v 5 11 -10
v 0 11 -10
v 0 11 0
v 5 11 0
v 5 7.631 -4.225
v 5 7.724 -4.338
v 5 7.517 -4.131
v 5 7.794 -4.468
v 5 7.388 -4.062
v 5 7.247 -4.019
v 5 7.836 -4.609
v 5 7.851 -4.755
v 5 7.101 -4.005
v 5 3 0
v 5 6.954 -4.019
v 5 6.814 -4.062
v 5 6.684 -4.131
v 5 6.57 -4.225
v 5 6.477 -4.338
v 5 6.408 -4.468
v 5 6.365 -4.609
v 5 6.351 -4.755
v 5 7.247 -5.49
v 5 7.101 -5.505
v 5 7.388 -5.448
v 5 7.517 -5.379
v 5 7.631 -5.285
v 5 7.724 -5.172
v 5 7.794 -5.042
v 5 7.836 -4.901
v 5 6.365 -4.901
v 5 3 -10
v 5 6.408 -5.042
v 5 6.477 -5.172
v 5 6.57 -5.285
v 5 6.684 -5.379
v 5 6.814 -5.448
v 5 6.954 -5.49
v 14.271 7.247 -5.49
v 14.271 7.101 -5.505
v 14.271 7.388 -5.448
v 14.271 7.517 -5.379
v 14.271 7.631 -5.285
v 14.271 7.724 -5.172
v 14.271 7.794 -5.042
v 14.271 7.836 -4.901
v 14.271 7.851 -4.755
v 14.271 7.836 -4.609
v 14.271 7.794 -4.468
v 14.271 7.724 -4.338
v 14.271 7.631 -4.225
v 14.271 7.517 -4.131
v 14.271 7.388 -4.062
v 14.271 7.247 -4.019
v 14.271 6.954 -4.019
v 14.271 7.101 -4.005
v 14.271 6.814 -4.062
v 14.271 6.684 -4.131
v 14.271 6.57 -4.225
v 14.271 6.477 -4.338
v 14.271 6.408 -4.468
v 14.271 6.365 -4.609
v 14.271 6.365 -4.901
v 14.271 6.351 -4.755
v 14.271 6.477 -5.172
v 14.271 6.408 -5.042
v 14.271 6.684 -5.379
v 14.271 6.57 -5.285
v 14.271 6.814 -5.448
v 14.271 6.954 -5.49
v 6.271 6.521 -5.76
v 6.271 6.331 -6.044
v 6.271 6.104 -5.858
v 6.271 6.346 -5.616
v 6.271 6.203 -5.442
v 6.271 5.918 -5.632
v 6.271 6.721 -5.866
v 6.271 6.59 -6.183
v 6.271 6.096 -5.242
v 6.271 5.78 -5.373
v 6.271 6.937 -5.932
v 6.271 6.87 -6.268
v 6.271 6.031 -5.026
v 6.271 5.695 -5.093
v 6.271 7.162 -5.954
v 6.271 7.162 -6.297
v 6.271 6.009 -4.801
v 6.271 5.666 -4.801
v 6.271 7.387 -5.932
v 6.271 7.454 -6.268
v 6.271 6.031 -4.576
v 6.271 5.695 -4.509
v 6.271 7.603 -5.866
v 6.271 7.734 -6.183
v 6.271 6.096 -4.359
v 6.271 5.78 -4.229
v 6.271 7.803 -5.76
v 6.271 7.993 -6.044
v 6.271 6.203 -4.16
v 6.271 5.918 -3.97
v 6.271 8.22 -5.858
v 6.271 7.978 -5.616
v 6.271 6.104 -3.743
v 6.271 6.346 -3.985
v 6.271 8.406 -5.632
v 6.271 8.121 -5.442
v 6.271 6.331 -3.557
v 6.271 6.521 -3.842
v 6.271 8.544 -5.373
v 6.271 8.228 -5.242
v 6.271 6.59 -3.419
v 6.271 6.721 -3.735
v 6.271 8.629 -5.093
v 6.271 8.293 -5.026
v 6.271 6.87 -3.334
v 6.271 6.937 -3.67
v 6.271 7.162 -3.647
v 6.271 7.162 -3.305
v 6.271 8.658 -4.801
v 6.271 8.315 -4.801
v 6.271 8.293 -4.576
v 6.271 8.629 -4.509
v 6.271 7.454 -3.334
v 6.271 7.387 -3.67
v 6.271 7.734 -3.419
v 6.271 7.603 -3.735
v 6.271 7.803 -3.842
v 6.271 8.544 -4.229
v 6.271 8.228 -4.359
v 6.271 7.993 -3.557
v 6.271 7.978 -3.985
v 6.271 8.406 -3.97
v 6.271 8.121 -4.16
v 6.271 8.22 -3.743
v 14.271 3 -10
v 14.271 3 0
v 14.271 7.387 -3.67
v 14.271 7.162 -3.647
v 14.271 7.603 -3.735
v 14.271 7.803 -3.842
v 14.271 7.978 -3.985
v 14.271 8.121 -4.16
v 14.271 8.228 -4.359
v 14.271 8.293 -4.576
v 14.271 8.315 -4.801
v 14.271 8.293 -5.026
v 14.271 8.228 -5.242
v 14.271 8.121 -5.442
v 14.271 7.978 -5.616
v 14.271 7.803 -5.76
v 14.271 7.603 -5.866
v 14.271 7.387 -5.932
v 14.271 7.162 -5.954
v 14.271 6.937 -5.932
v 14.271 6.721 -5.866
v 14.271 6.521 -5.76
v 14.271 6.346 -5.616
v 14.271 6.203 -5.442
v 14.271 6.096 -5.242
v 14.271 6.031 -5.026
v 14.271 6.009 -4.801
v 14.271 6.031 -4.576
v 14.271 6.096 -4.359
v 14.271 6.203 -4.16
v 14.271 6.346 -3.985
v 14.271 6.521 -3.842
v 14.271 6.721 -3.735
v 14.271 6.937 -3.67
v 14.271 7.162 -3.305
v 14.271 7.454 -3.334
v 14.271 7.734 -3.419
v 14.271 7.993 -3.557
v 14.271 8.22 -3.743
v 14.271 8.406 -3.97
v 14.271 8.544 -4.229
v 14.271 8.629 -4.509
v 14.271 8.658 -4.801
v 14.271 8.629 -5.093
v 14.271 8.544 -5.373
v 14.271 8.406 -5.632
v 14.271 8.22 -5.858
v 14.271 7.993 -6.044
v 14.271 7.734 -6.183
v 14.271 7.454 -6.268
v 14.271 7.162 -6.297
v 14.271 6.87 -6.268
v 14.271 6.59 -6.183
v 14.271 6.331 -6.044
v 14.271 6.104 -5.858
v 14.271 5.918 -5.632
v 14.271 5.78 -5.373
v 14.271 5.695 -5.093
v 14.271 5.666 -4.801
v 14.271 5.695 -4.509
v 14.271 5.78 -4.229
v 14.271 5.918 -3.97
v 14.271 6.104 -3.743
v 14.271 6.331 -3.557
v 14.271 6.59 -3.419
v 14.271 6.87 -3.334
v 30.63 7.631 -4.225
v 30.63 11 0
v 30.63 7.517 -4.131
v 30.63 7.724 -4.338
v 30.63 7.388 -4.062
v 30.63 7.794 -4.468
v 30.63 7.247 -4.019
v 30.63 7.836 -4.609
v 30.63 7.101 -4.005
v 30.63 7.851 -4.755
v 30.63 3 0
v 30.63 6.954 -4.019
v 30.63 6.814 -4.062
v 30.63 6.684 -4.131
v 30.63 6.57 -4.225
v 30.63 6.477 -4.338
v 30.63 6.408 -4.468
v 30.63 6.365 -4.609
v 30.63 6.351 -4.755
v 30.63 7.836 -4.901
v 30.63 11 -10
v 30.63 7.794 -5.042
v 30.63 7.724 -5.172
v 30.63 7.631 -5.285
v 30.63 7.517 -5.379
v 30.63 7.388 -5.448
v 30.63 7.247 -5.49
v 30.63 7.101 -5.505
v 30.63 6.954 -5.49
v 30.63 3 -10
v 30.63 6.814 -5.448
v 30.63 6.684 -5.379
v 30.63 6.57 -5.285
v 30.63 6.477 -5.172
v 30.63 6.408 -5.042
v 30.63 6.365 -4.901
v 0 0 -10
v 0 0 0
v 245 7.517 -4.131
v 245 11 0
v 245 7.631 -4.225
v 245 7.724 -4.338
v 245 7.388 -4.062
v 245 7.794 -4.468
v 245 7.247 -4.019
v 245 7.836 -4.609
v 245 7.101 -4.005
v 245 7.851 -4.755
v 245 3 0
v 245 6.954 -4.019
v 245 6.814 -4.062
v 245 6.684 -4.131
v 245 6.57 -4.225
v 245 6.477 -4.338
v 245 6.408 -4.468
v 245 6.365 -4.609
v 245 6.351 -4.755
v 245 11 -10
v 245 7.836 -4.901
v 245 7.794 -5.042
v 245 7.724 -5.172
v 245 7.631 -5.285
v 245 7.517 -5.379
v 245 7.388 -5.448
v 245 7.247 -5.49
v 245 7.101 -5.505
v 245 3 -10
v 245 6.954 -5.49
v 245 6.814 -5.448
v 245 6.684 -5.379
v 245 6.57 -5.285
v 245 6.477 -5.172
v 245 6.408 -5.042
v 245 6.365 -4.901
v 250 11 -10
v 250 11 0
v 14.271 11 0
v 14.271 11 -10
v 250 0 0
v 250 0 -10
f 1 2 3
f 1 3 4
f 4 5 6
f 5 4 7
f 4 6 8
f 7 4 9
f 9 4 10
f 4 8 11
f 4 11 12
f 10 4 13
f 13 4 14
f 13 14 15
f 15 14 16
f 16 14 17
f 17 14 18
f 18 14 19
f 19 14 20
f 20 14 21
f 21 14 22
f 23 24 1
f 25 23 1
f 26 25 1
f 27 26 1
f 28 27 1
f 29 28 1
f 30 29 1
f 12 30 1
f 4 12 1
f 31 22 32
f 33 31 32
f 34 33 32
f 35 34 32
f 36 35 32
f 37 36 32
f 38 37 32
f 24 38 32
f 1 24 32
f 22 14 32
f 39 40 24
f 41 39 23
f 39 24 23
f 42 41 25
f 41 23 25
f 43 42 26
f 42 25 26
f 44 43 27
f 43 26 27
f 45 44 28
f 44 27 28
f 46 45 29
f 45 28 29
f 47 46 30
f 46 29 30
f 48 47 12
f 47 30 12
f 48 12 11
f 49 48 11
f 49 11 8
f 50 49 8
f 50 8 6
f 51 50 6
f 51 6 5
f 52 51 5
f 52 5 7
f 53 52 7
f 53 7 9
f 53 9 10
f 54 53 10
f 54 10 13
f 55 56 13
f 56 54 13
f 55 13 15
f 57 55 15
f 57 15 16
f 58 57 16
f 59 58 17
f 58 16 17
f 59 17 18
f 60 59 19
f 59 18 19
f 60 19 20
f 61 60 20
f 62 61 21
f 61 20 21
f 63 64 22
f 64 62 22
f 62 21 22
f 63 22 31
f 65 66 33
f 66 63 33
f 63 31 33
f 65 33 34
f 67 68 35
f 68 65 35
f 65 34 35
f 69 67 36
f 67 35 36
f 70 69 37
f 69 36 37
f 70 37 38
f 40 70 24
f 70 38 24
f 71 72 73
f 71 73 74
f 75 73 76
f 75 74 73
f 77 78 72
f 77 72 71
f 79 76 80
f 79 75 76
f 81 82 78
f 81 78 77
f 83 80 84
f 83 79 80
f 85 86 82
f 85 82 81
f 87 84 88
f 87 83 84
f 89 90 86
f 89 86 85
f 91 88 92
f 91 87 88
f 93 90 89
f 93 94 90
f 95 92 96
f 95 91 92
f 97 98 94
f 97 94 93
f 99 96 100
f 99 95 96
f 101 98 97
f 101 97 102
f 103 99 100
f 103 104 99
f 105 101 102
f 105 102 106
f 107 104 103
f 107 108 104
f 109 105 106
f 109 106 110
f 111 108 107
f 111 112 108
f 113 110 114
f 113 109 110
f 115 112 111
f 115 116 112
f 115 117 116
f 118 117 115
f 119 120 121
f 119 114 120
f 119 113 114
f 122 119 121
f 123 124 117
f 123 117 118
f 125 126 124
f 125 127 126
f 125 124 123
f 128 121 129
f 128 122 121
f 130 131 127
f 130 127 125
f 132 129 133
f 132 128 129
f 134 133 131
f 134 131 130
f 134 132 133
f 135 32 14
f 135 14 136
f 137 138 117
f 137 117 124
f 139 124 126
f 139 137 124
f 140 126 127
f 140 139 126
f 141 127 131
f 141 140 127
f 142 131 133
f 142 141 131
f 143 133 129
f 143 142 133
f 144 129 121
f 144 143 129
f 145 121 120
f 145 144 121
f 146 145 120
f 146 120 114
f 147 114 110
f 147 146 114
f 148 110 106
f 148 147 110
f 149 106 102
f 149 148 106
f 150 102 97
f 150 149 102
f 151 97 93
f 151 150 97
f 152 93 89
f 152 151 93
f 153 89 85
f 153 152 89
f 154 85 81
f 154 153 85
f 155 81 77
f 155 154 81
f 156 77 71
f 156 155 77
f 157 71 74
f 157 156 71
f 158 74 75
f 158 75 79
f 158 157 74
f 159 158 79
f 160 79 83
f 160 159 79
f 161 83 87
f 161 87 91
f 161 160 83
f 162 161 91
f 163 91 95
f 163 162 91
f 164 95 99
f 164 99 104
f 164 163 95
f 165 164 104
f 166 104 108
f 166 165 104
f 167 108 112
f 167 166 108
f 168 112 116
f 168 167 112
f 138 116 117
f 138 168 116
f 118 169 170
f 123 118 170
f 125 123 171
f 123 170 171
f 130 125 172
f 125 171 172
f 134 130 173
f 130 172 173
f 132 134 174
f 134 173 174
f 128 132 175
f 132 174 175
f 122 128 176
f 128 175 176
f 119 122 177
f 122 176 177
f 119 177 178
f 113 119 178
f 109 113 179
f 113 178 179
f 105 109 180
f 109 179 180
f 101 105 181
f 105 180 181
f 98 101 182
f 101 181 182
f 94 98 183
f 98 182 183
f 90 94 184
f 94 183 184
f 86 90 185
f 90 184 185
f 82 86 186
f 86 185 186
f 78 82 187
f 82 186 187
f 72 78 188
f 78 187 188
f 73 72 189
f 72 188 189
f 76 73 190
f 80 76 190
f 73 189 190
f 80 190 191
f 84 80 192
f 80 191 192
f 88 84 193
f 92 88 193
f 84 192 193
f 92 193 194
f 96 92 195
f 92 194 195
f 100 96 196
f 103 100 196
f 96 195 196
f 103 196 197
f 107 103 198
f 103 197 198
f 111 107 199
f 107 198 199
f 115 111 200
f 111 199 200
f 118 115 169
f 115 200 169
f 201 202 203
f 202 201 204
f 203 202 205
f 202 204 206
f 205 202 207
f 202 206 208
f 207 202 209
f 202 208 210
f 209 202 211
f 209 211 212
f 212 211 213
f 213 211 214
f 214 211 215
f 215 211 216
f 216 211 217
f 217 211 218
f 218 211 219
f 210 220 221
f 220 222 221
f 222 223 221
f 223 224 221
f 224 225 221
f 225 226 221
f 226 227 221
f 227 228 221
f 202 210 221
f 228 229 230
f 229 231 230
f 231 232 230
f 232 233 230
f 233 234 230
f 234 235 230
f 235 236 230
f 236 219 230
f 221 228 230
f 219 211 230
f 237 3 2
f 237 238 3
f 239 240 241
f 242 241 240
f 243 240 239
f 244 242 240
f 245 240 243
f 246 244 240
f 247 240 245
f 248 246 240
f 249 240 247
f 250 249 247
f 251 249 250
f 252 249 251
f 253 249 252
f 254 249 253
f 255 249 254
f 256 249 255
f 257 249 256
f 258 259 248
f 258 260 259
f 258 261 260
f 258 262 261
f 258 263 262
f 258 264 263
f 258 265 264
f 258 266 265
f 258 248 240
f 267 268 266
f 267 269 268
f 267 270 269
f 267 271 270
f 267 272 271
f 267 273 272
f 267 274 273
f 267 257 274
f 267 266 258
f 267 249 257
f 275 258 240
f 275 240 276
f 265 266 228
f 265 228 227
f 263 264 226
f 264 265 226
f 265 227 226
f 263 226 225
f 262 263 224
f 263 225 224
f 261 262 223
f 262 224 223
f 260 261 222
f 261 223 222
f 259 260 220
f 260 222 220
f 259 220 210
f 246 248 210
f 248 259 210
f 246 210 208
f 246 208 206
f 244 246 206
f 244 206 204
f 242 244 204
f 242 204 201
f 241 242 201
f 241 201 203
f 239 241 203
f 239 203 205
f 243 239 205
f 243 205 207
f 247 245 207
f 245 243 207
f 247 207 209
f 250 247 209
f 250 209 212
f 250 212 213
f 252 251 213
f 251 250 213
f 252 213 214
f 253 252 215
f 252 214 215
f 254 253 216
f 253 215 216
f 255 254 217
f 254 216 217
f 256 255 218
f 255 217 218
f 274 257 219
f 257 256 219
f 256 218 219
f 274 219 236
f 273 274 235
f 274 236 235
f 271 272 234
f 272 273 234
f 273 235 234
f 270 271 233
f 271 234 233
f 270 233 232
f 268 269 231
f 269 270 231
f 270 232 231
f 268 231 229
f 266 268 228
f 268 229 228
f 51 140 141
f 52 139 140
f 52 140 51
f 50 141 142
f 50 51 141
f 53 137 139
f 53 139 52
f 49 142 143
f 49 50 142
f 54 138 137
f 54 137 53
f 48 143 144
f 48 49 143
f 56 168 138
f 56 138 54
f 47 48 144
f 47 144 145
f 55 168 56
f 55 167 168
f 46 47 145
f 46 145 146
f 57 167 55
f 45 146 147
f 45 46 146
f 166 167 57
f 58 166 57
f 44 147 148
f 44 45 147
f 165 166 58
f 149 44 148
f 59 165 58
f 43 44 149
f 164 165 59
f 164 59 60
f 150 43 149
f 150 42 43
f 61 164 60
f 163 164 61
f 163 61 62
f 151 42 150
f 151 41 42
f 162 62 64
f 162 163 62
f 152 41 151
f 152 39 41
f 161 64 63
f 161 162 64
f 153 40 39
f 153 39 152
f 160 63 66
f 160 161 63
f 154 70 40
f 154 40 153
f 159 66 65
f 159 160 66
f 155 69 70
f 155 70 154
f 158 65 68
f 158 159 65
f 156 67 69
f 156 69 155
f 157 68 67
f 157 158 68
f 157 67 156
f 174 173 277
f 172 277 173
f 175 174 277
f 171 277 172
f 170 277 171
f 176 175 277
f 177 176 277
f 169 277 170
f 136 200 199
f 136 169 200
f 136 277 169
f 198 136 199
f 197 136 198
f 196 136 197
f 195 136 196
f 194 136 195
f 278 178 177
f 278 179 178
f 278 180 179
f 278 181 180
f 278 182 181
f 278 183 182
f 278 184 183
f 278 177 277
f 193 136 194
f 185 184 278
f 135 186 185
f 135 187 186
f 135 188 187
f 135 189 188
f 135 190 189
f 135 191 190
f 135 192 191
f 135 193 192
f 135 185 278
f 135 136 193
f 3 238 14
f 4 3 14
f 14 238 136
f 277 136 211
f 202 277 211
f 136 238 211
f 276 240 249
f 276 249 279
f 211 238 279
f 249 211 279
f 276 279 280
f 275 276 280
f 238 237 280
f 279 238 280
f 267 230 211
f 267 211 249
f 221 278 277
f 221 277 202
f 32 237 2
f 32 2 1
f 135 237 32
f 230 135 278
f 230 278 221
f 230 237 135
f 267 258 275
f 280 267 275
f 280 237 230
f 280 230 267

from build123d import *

# Parameters (mm, degrees)
SKETCH2_W           = 250
SKETCH2_H           = 10
BOSS_EXTRUDE1_DEPTH = 3
SKETCH3_W           = 5
SKETCH3_H           = 10
BOSS_EXTRUDE2_DEPTH = 8
BOSS_EXTRUDE3_REACH = 247
SKETCH4_R           = 0.75
SKETCH5_W           = 16.35970525
SKETCH5_H           = 10
BOSS_EXTRUDE4_DEPTH = 8
SKETCH6_R           = 1.4956439
SKETCH6_R_2         = 1.153364649
BOSS_EXTRUDE5_DEPTH = 8


with BuildPart() as part:
    # Sketch2 → Boss-Extrude1 (new body)
    with BuildSketch(Plane(origin=(0, 0, 0), x_dir=(1, 0, 0), z_dir=(0, 1, 0))):
        with Locations((125, 5)):
            Rectangle(SKETCH2_W, SKETCH2_H)
    extrude(amount=BOSS_EXTRUDE1_DEPTH)

    # Sketch3 → Boss-Extrude2 (add)
    with BuildSketch(Plane(origin=(0, 3, 0), x_dir=(1, 0, 0), z_dir=(0, 1, 0))):
        with Locations((2.5, 5)):
            Rectangle(SKETCH3_W, SKETCH3_H)
        with Locations((247.5, 5)):
            Rectangle(SKETCH3_W, SKETCH3_H)
    extrude(amount=BOSS_EXTRUDE2_DEPTH)

    # Sketch4 → Boss-Extrude3 (add, up to next)
    with BuildSketch(Plane(origin=(5, 0, 0), x_dir=(0, 0, -1), z_dir=(1, 0, 0)), mode=Mode.PRIVATE) as boss_extrude3_sk1:
        with Locations((4.754905599, 7.100772806)):
            Circle(SKETCH4_R)
    boss_extrude3_tool1 = extrude(boss_extrude3_sk1.sketch, amount=BOSS_EXTRUDE3_REACH, mode=Mode.PRIVATE) - part.part
    add(boss_extrude3_tool1.solids().sort_by_distance((5, 7.100773, -4.754906))[0])

    # Sketch5 → Boss-Extrude4 (add)
    with BuildSketch(Plane(origin=(0, 3, 0), x_dir=(1, 0, 0), z_dir=(0, 1, 0))):
        with Locations((22.45057465, 5)):
            Rectangle(SKETCH5_W, SKETCH5_H)
    extrude(amount=BOSS_EXTRUDE4_DEPTH)

    # Sketch6 → Boss-Extrude5 (add)
    with BuildSketch(Plane.ZY.offset(-14.270722025)):
        with Locations((-4.800860799, 7.162046407)):
            Circle(SKETCH6_R)
        with Locations((-4.800860799, 7.162046407)):
            Circle(SKETCH6_R_2, mode=Mode.SUBTRACT)
    extrude(amount=BOSS_EXTRUDE5_DEPTH)


solid = part.part
